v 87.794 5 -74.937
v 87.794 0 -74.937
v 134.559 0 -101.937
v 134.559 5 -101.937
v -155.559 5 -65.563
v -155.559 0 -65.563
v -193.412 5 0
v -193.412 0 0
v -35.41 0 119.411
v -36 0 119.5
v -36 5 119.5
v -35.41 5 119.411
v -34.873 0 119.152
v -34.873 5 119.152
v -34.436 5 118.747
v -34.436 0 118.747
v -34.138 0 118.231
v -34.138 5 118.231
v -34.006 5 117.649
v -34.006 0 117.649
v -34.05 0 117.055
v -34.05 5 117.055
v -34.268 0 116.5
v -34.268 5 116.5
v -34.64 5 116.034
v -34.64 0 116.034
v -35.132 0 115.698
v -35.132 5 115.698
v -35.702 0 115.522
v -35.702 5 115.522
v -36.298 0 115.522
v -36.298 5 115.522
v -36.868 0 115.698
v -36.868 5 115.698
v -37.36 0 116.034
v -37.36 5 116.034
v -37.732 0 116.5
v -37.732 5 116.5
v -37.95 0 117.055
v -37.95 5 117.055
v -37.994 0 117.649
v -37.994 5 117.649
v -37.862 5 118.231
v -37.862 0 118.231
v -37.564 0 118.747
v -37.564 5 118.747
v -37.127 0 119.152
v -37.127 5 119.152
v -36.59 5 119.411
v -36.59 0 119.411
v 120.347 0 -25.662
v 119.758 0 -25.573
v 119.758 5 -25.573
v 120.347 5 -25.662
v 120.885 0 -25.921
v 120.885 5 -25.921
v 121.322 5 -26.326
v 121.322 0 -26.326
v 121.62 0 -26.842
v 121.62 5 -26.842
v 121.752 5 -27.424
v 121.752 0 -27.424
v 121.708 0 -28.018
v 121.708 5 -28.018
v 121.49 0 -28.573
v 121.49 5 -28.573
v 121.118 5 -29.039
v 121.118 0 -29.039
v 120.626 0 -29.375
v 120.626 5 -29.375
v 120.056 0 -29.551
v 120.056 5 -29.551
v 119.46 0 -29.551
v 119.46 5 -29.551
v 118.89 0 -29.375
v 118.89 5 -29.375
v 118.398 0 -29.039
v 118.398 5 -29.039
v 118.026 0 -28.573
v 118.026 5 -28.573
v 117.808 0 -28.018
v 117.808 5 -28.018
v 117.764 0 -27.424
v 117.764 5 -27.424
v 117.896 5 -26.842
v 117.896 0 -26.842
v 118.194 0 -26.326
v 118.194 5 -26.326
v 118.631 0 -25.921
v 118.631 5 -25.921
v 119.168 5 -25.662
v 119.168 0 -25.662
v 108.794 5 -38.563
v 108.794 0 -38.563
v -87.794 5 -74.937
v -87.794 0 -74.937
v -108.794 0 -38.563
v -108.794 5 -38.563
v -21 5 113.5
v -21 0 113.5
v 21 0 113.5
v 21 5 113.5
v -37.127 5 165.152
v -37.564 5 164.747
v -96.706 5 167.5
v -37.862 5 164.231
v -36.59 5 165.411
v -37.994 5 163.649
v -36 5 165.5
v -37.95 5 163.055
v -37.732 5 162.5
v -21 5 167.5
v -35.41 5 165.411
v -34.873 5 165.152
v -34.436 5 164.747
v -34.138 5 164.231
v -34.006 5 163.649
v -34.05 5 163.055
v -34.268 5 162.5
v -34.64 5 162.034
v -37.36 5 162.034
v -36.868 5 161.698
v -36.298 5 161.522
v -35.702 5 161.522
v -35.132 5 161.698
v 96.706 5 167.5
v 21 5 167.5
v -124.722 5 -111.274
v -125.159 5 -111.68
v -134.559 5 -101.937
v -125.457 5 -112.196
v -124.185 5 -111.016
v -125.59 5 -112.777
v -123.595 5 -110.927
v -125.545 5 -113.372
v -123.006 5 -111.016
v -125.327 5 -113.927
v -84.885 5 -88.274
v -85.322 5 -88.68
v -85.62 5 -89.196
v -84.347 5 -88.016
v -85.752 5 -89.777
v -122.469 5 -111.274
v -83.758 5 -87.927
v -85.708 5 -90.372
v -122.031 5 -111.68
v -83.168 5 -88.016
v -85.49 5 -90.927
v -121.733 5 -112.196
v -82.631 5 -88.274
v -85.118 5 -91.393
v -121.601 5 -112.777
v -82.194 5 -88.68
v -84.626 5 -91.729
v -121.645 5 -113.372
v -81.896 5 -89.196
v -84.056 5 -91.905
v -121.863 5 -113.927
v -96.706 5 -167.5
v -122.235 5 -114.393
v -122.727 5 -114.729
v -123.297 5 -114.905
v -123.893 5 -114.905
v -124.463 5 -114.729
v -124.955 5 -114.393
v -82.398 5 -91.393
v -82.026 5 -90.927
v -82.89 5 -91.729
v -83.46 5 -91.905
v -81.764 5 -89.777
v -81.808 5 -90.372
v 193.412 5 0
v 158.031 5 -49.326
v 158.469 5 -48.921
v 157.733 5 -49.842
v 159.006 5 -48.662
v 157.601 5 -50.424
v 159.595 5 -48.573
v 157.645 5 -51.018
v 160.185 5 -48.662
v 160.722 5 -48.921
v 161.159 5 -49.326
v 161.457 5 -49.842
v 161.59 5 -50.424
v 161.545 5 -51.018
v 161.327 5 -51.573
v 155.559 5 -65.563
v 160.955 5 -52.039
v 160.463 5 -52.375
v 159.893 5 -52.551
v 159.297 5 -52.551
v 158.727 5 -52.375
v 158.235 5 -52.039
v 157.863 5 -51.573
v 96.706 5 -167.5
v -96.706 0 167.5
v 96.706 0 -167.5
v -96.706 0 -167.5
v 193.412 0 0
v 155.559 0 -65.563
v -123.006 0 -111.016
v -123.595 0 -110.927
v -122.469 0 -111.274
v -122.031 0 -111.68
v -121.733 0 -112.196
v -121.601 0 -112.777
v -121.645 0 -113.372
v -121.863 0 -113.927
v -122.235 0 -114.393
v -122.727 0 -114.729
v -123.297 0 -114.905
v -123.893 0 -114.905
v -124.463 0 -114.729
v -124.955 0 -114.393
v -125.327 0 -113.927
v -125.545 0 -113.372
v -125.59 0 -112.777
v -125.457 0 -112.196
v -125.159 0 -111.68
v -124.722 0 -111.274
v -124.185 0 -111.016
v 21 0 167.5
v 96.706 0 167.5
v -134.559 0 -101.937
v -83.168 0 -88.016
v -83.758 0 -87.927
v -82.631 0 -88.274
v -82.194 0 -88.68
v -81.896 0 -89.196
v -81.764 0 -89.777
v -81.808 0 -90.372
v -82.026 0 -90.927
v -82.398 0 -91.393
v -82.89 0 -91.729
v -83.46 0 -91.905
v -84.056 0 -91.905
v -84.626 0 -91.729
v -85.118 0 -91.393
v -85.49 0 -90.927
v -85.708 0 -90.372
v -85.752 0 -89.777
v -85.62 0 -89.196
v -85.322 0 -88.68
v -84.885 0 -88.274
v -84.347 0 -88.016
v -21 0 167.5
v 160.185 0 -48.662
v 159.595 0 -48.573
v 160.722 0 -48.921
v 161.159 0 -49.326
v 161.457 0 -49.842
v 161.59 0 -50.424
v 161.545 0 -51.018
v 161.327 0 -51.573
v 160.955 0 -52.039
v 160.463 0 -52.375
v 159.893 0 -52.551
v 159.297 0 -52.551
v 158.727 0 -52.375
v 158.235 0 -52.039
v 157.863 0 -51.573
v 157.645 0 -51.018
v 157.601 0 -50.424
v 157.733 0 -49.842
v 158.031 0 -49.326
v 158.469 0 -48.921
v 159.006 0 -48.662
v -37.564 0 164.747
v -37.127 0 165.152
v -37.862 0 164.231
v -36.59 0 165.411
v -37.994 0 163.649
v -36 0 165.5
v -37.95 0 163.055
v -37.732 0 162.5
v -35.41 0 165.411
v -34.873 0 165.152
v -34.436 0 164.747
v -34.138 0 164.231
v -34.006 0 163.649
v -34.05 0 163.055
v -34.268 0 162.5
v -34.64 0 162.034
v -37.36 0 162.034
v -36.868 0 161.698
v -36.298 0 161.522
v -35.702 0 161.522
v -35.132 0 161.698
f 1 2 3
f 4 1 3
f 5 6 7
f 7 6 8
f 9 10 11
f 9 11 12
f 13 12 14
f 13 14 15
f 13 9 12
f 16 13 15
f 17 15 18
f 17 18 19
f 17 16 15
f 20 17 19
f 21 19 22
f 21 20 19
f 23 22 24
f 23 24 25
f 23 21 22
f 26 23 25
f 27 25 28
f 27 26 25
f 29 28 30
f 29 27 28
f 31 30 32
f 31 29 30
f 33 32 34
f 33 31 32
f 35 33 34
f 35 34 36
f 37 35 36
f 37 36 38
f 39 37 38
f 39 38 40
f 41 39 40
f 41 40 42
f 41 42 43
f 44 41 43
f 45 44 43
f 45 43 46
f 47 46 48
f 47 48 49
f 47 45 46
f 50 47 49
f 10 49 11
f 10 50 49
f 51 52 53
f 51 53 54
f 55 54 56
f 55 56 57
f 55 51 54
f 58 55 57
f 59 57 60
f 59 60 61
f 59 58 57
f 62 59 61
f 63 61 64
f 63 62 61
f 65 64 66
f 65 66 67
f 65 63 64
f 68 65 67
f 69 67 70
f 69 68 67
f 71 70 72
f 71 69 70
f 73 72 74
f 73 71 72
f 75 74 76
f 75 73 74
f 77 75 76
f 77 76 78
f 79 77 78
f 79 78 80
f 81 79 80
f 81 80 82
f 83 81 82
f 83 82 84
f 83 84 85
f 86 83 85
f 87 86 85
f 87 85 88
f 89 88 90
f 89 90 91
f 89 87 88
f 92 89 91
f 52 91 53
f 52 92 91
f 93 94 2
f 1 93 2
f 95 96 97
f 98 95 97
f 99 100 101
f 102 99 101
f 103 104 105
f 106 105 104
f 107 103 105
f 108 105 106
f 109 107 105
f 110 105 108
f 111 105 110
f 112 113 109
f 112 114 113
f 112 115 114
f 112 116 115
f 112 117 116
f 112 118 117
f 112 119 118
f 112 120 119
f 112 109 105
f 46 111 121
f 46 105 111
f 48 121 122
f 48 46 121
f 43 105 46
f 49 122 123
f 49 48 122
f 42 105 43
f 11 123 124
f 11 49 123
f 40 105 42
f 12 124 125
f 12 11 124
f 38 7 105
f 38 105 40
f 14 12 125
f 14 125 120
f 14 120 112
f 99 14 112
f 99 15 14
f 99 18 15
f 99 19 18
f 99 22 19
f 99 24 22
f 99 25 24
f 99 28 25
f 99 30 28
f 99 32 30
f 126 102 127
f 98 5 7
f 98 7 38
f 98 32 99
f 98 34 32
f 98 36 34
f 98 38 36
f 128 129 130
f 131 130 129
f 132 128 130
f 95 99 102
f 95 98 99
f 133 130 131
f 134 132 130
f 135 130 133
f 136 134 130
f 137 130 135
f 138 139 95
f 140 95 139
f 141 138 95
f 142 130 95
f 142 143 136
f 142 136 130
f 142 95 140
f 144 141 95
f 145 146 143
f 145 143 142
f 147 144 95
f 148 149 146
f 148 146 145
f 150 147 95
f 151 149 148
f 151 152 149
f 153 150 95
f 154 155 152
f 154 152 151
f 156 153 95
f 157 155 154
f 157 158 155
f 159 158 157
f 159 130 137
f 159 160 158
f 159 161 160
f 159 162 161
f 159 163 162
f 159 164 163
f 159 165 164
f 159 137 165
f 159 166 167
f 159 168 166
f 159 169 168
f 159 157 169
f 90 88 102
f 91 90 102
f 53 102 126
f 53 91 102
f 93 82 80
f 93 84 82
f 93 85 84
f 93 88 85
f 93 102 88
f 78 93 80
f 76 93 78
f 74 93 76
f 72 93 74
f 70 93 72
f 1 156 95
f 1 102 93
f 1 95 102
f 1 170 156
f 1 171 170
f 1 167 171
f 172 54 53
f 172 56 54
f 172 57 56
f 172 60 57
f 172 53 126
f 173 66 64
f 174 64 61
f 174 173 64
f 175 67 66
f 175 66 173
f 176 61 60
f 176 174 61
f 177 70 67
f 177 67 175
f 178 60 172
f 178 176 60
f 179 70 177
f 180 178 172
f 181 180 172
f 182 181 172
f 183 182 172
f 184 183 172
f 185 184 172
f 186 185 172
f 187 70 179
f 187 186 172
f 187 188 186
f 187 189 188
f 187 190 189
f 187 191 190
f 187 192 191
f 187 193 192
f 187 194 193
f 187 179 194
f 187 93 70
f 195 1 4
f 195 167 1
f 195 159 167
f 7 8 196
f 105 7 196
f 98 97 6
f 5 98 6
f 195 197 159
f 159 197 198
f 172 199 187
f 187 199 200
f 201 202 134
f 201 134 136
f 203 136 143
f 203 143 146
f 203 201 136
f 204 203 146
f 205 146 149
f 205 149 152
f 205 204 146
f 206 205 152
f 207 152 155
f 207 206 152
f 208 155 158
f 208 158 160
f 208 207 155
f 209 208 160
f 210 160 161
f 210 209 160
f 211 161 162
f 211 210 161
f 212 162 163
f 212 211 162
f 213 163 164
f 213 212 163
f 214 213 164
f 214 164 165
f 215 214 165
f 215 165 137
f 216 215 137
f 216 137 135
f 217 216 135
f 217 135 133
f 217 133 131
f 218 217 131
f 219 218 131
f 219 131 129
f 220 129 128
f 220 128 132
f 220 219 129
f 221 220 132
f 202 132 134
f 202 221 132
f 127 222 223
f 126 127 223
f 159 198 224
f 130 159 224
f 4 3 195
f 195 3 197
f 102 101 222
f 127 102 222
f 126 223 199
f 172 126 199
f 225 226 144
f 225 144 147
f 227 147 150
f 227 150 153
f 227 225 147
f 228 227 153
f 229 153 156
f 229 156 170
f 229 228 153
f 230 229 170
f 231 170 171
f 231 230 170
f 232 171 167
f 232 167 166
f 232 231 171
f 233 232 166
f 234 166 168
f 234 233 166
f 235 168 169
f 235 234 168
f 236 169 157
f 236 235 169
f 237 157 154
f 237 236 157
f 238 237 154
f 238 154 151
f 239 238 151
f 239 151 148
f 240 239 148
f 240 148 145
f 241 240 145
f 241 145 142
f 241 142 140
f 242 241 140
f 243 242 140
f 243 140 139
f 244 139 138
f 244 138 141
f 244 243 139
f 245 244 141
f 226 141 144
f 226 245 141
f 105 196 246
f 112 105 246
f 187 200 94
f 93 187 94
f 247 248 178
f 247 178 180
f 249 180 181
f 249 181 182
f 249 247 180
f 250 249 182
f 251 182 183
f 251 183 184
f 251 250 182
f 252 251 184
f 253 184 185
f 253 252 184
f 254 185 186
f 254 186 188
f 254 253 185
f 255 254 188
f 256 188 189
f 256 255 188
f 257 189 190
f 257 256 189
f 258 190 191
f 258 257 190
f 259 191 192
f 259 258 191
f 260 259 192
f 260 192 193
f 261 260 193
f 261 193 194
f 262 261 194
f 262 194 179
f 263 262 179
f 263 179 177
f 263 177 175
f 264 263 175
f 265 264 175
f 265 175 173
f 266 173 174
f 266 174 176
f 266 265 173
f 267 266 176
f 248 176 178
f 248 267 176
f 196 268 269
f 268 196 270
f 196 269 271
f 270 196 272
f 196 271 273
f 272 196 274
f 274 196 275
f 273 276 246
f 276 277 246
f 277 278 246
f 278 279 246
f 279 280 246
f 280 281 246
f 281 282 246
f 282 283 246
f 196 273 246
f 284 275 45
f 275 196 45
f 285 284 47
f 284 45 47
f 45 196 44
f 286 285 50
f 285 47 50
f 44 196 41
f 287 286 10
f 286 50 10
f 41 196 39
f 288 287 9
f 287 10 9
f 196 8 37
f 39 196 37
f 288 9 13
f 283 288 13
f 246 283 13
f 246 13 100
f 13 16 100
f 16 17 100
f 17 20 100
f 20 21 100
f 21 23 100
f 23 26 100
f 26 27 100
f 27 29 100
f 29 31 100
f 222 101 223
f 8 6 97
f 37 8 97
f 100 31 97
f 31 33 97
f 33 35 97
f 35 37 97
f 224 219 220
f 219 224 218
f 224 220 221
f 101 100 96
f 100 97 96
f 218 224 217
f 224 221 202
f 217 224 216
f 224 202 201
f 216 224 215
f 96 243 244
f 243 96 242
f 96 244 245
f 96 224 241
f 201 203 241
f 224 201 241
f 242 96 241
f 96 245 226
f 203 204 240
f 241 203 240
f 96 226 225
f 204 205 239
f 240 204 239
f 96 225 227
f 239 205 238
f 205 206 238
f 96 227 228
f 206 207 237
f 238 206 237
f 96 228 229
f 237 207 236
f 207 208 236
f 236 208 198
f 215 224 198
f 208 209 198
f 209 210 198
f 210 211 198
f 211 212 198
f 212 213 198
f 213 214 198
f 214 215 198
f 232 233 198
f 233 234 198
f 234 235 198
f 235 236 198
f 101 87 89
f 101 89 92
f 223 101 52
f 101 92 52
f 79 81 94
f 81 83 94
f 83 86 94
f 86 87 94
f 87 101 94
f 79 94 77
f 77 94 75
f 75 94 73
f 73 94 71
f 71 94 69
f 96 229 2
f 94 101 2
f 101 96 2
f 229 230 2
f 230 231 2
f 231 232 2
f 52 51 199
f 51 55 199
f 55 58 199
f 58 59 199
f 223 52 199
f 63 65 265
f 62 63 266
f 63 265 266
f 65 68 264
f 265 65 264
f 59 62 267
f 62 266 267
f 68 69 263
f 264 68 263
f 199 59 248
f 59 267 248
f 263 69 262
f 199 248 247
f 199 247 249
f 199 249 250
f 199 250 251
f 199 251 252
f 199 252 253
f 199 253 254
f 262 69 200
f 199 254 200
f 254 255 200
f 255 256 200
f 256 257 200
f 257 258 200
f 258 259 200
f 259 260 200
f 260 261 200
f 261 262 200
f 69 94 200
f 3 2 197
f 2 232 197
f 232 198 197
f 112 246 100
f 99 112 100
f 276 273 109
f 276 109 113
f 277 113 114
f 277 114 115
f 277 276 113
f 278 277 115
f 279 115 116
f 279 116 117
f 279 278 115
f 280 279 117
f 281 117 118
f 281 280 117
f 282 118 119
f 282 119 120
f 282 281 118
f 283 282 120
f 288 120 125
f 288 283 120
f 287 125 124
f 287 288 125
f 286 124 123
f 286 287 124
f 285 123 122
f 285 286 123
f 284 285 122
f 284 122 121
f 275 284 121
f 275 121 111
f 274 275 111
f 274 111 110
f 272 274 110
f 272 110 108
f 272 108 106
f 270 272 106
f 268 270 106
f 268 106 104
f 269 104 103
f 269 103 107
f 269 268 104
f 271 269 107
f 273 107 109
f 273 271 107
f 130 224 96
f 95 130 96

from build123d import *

# Parameters (mm, degrees)
SKETCH1_R           = 2
BOSS_EXTRUDE1_DEPTH = 5


with BuildPart() as part:
    # Sketch1 → Boss-Extrude1 (new body)
    with BuildSketch(Plane(origin=(0, 0, 0), x_dir=(1, 0, 0), z_dir=(0, 1, 0))):
        Polygon((-96.706170089, 167.5), (-134.559255134, 101.936533479), (-87.79388333, 74.936533479), (-108.79388333, 38.563466521), (-155.559255134, 65.563466521), (-193.412340179, 0), (-96.706170089, -167.5), (-21, -167.5), (-21, -113.5), (21, -113.5), (21, -167.5), (96.706170089, -167.5), (193.412340179, 0), (155.559255134, 65.563466521), (108.79388333, 38.563466521), (87.79388333, 74.936533479), (134.559255134, 101.936533479), (96.706170089, 167.5), align=None)
        with Locations(Location((-36, -163.5, 0), (0, 0, 270))):
            Circle(SKETCH1_R, mode=Mode.SUBTRACT)
        with Locations(Location((-36, -117.5, 0), (0, 0, 270))):
            Circle(SKETCH1_R, mode=Mode.SUBTRACT)
        with Locations(Location((-123.595153519, 112.926914536, 0), (0, 0, 270))):
            Circle(SKETCH1_R, mode=Mode.SUBTRACT)
        with Locations(Location((-83.757984945, 89.926914536, 0), (0, 0, 270))):
            Circle(SKETCH1_R, mode=Mode.SUBTRACT)
        with Locations(Location((159.595153519, 50.573085464, 0), (0, 0, 270))):
            Circle(SKETCH1_R, mode=Mode.SUBTRACT)
        with Locations(Location((119.757984945, 27.573085464, 0), (0, 0, 270))):
            Circle(SKETCH1_R, mode=Mode.SUBTRACT)
    extrude(amount=BOSS_EXTRUDE1_DEPTH)


solid = part.part
